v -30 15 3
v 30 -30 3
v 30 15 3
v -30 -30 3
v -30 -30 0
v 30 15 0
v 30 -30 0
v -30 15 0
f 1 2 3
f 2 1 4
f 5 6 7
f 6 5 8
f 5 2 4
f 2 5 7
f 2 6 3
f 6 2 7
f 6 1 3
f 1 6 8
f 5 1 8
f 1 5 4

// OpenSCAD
// Plate parameters
plate_width = 60;
plate_height = 45;
plate_thickness = 3;

// Design parameters
design_filename = "Sample inputs/flourish-60x45.dxf";
design_thickness = 1.5;

// Call the name of the module you want to run
// (choose from relief(), intaglio() and stencil()
relief();

/*************************************************
 Generate an embossing plate
 - Extrudes your design and places it on top of a flat plate
**************************************************/
module relief() {
	translate([-plate_width/2, -plate_width/2, 0]) {
		// Create the plate under the design
		cube(size = [plate_width, plate_height, plate_thickness]);
	
		// Place the design on top of the plate
		translate([0,0,plate_thickness])
			linear_extrude(height = design_thickness)
				import(design_filename);
	}
}

/**************************************************
 Generate a debossing plate
 - Subtracts your design into the top of a single plate
***************************************************/
module intaglio() {
	translate([-plate_width/2, -plate_width/2, 0]) {
		difference() {
			// Create the plate under the design
			cube(size = [plate_width, plate_height, plate_thickness]);
	
			// Subtract the design from the top of the plate
			translate([0, 0, plate_thickness - design_thickness])
				linear_extrude(height = design_thickness)
					import(design_filename);
		}
	}
}

/***************************************************
 Generate a stencil
 - Cuts your design all the way through a plate
****************************************************/
module stencil() {
	translate([-plate_width/2, -plate_width/2, 0]) {
		difference() {
			// Create the plate under the design
			cube(size = [plate_width, plate_height, plate_thickness]);
	
			// Subtract the design from the plate
			linear_extrude(height = plate_thickness)
				import(design_filename);
		}
	}
}
